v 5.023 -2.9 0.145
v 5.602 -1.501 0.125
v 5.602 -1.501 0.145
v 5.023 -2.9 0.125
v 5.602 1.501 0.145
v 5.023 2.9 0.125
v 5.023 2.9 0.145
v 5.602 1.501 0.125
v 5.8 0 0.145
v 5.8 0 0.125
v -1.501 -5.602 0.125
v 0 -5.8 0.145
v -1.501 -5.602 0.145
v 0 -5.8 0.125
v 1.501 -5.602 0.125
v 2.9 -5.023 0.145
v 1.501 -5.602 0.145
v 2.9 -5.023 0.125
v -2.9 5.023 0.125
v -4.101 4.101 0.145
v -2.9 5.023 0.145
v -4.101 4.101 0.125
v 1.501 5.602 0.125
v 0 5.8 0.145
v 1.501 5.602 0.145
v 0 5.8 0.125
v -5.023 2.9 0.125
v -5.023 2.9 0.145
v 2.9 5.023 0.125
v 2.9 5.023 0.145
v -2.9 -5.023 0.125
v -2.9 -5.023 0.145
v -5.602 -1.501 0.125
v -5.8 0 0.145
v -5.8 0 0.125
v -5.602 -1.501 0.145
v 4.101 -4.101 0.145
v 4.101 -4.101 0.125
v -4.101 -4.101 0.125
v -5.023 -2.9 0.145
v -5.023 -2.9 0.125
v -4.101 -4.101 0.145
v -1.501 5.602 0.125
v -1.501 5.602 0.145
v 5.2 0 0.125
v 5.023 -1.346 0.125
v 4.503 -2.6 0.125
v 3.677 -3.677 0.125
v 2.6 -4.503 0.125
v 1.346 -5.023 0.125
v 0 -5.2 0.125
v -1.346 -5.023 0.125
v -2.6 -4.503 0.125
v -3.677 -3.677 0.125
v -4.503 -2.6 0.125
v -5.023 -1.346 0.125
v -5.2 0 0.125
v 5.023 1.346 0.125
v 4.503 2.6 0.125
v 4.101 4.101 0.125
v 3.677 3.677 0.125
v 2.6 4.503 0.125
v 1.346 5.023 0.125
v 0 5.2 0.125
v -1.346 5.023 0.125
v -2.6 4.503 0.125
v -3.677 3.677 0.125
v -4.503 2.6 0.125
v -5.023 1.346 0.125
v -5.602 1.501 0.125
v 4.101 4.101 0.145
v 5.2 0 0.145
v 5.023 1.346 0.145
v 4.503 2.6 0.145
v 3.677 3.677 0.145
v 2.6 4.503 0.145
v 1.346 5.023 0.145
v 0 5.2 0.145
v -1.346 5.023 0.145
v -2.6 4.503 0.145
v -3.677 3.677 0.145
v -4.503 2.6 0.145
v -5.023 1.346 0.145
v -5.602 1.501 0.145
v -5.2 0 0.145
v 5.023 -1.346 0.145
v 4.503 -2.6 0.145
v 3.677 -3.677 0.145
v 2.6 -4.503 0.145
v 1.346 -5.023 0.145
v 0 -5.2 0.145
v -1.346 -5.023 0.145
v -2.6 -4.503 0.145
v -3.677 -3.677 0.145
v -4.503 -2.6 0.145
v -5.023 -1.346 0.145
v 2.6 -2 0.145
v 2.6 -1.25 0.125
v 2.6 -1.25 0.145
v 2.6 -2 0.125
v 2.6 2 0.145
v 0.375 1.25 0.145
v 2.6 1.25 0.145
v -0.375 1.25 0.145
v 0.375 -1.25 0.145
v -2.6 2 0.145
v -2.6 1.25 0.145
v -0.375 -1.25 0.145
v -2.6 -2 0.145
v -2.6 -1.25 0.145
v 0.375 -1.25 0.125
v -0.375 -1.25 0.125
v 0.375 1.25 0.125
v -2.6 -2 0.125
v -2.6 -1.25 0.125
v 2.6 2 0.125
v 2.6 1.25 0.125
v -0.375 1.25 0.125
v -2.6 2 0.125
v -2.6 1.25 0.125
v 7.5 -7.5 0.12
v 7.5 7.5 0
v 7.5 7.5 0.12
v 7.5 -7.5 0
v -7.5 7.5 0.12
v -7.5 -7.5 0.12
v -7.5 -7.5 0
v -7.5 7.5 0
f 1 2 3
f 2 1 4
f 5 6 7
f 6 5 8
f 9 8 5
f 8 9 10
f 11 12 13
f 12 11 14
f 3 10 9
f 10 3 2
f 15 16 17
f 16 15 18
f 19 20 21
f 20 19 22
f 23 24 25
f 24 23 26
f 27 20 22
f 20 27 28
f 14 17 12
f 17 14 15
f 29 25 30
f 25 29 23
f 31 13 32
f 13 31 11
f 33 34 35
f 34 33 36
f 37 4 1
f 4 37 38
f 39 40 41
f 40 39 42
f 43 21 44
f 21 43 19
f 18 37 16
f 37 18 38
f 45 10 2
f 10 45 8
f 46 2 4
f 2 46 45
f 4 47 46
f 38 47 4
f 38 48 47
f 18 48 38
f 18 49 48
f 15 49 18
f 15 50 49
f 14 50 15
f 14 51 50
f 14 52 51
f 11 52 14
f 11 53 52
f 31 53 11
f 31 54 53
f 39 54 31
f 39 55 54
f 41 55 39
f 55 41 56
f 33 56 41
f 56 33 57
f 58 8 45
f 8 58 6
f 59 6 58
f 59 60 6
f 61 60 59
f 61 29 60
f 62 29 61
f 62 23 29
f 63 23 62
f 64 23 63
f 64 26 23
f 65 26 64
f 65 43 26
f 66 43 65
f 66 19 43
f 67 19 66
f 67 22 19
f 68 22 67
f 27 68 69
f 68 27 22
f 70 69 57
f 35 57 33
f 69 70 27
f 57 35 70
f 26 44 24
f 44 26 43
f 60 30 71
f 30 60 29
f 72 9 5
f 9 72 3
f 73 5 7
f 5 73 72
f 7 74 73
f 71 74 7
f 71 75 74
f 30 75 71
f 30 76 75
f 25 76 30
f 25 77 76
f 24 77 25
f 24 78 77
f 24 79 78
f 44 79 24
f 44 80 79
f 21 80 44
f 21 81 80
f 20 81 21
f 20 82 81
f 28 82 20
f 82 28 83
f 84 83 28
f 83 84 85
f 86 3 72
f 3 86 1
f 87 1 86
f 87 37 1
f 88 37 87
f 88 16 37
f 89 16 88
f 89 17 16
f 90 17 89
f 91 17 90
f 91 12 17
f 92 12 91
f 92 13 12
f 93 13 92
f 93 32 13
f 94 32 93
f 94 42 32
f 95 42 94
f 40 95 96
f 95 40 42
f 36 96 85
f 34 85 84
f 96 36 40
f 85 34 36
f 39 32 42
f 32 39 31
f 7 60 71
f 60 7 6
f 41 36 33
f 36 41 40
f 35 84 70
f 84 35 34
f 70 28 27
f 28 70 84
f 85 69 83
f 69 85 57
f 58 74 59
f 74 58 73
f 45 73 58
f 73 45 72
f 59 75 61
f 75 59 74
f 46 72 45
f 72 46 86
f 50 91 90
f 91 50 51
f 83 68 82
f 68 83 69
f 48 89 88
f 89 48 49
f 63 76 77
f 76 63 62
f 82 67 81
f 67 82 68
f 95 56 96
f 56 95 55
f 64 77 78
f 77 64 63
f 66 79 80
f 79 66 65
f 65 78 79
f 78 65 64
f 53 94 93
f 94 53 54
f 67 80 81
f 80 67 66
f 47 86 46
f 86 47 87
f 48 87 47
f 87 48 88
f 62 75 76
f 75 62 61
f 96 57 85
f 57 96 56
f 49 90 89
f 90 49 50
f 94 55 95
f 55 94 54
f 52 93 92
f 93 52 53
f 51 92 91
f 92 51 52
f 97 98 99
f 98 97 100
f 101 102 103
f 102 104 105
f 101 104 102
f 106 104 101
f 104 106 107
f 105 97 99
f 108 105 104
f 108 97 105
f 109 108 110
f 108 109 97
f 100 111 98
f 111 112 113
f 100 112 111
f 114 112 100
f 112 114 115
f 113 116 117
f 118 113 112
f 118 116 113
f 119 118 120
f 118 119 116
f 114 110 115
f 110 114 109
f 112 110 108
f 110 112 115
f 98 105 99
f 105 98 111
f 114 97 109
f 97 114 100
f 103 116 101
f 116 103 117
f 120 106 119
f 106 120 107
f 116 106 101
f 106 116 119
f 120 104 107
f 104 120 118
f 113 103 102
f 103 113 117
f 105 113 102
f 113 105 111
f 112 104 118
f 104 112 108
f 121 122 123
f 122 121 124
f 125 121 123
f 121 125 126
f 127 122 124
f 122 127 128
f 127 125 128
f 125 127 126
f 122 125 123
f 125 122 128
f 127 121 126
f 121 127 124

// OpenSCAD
// Helipad — landing pad for the heli-ski helicopter.
// Concrete slab with classic yellow H and touchdown circle.
//
// Conventions, units, and axis docs: see models-src/README.md.
//
//   +X = helicopter approach axis
//   +Y = lateral
//   +Z = up
//
// Origin at Z = 0, centre of footprint.
// ICAO standard for light-helicopter pad: ≥ 15 m × 15 m.

$fn = 24;

// ── Dimensions (metres) ────────────────────────────────────────────────────

pad_size = 15.0;  // square pad (X and Y)
pad_thk  =  0.12; // concrete slab thickness

mark_thk =  0.02; // painted-marking thickness
mark_z   = pad_thk + 0.005; // marking surface sits just above slab

// Touchdown circle (ring)
circ_ro = 5.8;  // outer radius
circ_ri = 5.2;  // inner radius (ring width 0.6 m)

// H marking
H_len  = 5.2;   // leg length (X)
H_span = 4.0;   // outer leg span (Y)
H_bar  = 0.75;  // width of each bar

// ── Derived ────────────────────────────────────────────────────────────────
H_leg_y  = H_span / 2 - H_bar / 2;        // leg centre Y offset from origin
H_xbar_w = H_span - 2 * H_bar;            // crossbar Y extent (between inner faces)

// ── Modules ────────────────────────────────────────────────────────────────

module slab() {
    color([0.20, 0.20, 0.22]) // dark asphalt
    translate([0, 0, pad_thk / 2])
        cube([pad_size, pad_size, pad_thk], center = true);
}

module circle_marking() {
    color([0.92, 0.82, 0.05]) // safety yellow
    translate([0, 0, mark_z])
        difference() {
            cylinder(h = mark_thk, r = circ_ro);
            // Subtract inner cylinder — leaves a ring
            translate([0, 0, -0.01])
                cylinder(h = mark_thk + 0.02, r = circ_ri);
        }
}

module H_marking() {
    color([0.92, 0.82, 0.05])
    translate([0, 0, mark_z]) {
        // Left leg
        translate([0, -H_leg_y, mark_thk / 2])
            cube([H_len, H_bar, mark_thk], center = true);
        // Right leg
        translate([0, +H_leg_y, mark_thk / 2])
            cube([H_len, H_bar, mark_thk], center = true);
        // Crossbar
        translate([0, 0, mark_thk / 2])
            cube([H_bar, H_xbar_w, mark_thk], center = true);
    }
}

module helipad() {
    slab();
    circle_marking();
    H_marking();
}

echo("MOGUL_META", "footprint", pad_size / 2, pad_size / 2);

helipad();
